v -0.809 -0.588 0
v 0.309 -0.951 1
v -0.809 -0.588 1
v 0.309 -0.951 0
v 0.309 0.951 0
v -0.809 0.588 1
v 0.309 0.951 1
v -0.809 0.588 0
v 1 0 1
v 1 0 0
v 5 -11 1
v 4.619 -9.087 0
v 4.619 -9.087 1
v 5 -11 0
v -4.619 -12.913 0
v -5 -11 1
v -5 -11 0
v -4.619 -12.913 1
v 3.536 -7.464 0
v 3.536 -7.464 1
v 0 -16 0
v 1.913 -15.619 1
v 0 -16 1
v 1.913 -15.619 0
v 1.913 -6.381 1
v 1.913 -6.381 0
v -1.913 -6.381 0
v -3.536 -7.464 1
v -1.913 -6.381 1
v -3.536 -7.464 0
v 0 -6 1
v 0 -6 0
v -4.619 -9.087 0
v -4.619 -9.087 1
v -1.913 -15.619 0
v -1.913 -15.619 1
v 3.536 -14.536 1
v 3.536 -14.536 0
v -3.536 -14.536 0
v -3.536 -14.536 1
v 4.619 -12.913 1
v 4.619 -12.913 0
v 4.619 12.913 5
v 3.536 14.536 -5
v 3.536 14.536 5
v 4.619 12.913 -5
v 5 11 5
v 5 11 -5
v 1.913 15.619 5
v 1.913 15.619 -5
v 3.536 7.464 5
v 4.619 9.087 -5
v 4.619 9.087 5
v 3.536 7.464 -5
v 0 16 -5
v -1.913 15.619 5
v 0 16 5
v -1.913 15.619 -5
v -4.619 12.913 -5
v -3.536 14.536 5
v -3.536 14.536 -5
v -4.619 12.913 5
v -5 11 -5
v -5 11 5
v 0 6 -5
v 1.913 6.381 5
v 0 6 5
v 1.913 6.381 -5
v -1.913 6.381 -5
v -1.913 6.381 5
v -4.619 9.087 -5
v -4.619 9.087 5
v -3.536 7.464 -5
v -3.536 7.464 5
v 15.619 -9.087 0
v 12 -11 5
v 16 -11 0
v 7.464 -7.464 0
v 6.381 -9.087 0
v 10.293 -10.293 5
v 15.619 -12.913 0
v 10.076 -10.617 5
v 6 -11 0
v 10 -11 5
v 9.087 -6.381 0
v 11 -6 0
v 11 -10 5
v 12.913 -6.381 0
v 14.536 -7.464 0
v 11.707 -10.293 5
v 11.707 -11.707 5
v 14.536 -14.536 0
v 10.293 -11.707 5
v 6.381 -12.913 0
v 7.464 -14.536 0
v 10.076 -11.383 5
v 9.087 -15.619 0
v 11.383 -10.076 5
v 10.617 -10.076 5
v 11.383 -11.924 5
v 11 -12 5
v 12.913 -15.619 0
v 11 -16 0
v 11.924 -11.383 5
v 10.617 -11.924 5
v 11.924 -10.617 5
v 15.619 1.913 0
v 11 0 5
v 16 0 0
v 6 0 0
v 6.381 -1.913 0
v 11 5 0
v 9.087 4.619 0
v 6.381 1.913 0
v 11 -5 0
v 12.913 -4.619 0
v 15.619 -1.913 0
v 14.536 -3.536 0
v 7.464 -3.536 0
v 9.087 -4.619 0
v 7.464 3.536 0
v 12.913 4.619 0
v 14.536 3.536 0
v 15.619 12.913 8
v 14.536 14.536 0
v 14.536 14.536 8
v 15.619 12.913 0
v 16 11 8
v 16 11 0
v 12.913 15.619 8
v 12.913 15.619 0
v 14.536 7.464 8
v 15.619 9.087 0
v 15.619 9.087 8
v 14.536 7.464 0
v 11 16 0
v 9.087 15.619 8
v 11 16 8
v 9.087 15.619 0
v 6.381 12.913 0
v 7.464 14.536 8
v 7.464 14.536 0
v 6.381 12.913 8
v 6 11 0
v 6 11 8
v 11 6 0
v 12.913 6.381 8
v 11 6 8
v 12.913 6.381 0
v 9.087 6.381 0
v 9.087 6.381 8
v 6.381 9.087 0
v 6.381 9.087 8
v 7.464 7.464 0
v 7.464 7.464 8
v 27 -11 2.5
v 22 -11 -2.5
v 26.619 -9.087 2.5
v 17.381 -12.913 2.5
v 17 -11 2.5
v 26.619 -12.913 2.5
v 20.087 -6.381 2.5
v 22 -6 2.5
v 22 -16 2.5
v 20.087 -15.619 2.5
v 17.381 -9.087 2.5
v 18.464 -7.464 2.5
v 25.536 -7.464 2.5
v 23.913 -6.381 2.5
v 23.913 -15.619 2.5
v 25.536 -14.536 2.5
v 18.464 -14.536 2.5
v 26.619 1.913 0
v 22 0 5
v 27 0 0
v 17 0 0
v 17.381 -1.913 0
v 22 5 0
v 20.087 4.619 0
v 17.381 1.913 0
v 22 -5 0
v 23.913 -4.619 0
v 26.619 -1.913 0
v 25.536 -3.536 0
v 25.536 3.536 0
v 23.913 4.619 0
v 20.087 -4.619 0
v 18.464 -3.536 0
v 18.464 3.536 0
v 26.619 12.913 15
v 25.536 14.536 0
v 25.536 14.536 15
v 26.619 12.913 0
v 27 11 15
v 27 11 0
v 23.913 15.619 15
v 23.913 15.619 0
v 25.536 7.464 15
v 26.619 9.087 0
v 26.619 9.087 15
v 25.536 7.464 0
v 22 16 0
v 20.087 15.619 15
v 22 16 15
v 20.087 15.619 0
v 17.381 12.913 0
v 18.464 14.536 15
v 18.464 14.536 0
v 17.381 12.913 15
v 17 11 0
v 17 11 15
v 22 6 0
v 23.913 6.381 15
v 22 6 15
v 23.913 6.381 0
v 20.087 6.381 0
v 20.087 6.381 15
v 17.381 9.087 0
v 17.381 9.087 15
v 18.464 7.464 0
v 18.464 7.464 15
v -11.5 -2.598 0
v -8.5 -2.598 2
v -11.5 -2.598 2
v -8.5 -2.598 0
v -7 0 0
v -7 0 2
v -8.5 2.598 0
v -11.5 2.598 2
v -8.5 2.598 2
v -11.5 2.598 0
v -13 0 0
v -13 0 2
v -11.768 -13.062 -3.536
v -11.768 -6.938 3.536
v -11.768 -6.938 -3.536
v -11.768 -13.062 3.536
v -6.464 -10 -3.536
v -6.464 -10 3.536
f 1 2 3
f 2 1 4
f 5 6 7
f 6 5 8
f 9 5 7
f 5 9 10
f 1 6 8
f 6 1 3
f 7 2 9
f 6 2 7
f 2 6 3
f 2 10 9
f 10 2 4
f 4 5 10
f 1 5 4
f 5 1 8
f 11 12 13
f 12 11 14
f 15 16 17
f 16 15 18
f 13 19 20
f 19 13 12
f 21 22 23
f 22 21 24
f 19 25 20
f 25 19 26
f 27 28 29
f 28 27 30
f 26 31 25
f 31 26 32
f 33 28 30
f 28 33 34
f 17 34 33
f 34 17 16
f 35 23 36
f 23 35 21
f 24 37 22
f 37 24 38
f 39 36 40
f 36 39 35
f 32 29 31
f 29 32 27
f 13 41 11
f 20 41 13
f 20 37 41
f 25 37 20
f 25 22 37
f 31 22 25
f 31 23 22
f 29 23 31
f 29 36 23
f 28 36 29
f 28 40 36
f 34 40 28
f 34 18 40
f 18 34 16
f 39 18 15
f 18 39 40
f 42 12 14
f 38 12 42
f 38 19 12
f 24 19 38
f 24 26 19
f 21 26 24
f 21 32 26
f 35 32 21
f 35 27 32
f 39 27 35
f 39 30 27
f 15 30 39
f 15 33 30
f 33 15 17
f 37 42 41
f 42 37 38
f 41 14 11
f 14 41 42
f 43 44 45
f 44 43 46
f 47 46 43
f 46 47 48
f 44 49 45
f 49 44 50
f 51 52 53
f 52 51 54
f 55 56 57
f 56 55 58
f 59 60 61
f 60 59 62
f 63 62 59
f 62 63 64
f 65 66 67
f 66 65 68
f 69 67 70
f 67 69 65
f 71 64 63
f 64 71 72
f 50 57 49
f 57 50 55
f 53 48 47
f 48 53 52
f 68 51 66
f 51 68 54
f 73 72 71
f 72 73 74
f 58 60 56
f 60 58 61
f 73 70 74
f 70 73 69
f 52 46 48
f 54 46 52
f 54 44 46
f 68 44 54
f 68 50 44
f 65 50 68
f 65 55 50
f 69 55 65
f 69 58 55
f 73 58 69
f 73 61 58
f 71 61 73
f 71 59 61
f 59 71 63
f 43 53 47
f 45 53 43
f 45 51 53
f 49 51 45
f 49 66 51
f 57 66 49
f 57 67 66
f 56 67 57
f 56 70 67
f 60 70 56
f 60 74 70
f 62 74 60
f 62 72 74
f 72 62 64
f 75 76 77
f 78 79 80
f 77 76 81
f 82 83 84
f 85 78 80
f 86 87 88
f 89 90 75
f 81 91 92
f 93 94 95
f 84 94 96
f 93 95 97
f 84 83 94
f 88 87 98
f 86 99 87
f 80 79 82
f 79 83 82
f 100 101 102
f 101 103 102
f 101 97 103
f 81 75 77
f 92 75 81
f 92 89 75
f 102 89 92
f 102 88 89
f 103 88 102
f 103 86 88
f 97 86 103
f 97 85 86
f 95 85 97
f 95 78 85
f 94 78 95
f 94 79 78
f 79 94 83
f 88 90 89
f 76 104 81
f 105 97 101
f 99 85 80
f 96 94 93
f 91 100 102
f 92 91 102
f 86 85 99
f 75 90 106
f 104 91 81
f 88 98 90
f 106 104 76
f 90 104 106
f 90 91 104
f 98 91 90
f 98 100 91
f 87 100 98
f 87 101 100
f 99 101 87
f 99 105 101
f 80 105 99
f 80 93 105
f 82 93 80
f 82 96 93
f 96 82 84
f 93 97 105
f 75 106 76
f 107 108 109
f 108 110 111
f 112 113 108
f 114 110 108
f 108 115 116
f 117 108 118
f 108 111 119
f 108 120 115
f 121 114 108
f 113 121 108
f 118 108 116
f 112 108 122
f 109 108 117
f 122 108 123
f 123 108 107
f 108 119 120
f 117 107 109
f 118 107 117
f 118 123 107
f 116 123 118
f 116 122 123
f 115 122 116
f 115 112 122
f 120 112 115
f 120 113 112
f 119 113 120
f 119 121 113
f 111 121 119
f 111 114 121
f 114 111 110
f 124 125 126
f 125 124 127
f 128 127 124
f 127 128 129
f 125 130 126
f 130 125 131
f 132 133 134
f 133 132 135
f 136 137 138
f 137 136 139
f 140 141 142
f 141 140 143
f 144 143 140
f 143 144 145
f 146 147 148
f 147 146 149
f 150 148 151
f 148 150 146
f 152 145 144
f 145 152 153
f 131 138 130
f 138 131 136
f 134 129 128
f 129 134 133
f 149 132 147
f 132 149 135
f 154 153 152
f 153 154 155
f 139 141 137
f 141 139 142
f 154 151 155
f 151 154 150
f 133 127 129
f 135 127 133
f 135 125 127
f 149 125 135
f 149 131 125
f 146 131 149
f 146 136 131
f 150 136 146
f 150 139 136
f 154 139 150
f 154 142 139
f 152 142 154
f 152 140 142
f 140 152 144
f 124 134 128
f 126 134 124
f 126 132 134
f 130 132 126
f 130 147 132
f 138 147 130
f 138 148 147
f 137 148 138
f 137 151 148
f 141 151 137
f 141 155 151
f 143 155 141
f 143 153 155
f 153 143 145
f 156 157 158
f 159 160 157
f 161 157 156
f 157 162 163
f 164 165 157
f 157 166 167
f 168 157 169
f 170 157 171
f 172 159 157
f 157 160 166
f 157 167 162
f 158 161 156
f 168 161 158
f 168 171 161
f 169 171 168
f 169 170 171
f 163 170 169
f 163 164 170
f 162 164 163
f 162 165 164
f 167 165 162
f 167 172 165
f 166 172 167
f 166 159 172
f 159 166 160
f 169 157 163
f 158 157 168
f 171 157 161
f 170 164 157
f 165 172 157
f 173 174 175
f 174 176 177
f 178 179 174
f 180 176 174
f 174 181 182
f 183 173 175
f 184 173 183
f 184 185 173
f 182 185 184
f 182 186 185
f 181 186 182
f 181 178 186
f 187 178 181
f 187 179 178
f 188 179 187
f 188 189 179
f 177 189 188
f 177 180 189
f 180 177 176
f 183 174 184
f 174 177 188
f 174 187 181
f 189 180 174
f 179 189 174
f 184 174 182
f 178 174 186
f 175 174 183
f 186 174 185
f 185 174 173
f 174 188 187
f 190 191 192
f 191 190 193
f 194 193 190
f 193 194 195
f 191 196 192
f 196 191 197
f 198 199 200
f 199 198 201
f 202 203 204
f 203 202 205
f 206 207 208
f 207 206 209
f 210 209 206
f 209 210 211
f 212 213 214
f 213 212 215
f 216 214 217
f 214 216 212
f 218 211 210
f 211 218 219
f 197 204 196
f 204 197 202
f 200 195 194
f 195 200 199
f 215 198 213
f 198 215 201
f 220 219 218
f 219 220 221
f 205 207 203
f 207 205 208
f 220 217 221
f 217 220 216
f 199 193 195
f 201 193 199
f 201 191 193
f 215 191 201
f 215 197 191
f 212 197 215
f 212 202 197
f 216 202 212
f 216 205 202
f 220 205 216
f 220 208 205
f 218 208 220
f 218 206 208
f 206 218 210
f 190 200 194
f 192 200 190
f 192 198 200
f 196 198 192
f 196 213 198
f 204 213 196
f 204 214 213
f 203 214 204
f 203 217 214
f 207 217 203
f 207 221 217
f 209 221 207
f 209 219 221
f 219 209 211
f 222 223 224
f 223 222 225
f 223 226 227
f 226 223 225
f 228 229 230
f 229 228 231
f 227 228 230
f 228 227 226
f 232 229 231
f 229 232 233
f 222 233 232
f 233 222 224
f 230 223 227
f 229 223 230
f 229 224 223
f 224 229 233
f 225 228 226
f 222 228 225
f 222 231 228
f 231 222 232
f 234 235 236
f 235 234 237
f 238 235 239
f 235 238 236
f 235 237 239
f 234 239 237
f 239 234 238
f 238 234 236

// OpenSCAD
// Volume: 3307.0744045099973, SurfaceArea: 2685.5176023809718
cylinder();
translate([1,0,0]) cylinder(r=0);
translate([2,0,0]) cylinder(r1=0, r2=0);
translate([0,-11,0]) cylinder(r=5);
translate([0,11,0]) cylinder(r=5, h=10, center=true);

translate([11,-11,0]) cylinder(h=5, r1=5);
translate([11,0,0]) cylinder(h=5, r1=5, r2=0);
translate([11,11,0]) cylinder(h=8, r1=5, r2=5);

translate([22,-11,0]) cylinder(h=5, r=5, r1=0, center=true);
translate([22,0,0]) cylinder(h=5, r=5, r2=0);
translate([22,11,0]) cylinder(h=15, r=5, r2=5);

// This tests for hexagonal cylinder orientation, since people
// tend to "abuse" this for captured nut slots
translate([-10,0,0]) cylinder(h=2, r=3, $fn=6);

// Test that we clamp number of sections to a minimum of 3
translate([-10, -10, 0]) cylinder(r=3.5356, h=7.0711, $fn=0.1, center=true);
